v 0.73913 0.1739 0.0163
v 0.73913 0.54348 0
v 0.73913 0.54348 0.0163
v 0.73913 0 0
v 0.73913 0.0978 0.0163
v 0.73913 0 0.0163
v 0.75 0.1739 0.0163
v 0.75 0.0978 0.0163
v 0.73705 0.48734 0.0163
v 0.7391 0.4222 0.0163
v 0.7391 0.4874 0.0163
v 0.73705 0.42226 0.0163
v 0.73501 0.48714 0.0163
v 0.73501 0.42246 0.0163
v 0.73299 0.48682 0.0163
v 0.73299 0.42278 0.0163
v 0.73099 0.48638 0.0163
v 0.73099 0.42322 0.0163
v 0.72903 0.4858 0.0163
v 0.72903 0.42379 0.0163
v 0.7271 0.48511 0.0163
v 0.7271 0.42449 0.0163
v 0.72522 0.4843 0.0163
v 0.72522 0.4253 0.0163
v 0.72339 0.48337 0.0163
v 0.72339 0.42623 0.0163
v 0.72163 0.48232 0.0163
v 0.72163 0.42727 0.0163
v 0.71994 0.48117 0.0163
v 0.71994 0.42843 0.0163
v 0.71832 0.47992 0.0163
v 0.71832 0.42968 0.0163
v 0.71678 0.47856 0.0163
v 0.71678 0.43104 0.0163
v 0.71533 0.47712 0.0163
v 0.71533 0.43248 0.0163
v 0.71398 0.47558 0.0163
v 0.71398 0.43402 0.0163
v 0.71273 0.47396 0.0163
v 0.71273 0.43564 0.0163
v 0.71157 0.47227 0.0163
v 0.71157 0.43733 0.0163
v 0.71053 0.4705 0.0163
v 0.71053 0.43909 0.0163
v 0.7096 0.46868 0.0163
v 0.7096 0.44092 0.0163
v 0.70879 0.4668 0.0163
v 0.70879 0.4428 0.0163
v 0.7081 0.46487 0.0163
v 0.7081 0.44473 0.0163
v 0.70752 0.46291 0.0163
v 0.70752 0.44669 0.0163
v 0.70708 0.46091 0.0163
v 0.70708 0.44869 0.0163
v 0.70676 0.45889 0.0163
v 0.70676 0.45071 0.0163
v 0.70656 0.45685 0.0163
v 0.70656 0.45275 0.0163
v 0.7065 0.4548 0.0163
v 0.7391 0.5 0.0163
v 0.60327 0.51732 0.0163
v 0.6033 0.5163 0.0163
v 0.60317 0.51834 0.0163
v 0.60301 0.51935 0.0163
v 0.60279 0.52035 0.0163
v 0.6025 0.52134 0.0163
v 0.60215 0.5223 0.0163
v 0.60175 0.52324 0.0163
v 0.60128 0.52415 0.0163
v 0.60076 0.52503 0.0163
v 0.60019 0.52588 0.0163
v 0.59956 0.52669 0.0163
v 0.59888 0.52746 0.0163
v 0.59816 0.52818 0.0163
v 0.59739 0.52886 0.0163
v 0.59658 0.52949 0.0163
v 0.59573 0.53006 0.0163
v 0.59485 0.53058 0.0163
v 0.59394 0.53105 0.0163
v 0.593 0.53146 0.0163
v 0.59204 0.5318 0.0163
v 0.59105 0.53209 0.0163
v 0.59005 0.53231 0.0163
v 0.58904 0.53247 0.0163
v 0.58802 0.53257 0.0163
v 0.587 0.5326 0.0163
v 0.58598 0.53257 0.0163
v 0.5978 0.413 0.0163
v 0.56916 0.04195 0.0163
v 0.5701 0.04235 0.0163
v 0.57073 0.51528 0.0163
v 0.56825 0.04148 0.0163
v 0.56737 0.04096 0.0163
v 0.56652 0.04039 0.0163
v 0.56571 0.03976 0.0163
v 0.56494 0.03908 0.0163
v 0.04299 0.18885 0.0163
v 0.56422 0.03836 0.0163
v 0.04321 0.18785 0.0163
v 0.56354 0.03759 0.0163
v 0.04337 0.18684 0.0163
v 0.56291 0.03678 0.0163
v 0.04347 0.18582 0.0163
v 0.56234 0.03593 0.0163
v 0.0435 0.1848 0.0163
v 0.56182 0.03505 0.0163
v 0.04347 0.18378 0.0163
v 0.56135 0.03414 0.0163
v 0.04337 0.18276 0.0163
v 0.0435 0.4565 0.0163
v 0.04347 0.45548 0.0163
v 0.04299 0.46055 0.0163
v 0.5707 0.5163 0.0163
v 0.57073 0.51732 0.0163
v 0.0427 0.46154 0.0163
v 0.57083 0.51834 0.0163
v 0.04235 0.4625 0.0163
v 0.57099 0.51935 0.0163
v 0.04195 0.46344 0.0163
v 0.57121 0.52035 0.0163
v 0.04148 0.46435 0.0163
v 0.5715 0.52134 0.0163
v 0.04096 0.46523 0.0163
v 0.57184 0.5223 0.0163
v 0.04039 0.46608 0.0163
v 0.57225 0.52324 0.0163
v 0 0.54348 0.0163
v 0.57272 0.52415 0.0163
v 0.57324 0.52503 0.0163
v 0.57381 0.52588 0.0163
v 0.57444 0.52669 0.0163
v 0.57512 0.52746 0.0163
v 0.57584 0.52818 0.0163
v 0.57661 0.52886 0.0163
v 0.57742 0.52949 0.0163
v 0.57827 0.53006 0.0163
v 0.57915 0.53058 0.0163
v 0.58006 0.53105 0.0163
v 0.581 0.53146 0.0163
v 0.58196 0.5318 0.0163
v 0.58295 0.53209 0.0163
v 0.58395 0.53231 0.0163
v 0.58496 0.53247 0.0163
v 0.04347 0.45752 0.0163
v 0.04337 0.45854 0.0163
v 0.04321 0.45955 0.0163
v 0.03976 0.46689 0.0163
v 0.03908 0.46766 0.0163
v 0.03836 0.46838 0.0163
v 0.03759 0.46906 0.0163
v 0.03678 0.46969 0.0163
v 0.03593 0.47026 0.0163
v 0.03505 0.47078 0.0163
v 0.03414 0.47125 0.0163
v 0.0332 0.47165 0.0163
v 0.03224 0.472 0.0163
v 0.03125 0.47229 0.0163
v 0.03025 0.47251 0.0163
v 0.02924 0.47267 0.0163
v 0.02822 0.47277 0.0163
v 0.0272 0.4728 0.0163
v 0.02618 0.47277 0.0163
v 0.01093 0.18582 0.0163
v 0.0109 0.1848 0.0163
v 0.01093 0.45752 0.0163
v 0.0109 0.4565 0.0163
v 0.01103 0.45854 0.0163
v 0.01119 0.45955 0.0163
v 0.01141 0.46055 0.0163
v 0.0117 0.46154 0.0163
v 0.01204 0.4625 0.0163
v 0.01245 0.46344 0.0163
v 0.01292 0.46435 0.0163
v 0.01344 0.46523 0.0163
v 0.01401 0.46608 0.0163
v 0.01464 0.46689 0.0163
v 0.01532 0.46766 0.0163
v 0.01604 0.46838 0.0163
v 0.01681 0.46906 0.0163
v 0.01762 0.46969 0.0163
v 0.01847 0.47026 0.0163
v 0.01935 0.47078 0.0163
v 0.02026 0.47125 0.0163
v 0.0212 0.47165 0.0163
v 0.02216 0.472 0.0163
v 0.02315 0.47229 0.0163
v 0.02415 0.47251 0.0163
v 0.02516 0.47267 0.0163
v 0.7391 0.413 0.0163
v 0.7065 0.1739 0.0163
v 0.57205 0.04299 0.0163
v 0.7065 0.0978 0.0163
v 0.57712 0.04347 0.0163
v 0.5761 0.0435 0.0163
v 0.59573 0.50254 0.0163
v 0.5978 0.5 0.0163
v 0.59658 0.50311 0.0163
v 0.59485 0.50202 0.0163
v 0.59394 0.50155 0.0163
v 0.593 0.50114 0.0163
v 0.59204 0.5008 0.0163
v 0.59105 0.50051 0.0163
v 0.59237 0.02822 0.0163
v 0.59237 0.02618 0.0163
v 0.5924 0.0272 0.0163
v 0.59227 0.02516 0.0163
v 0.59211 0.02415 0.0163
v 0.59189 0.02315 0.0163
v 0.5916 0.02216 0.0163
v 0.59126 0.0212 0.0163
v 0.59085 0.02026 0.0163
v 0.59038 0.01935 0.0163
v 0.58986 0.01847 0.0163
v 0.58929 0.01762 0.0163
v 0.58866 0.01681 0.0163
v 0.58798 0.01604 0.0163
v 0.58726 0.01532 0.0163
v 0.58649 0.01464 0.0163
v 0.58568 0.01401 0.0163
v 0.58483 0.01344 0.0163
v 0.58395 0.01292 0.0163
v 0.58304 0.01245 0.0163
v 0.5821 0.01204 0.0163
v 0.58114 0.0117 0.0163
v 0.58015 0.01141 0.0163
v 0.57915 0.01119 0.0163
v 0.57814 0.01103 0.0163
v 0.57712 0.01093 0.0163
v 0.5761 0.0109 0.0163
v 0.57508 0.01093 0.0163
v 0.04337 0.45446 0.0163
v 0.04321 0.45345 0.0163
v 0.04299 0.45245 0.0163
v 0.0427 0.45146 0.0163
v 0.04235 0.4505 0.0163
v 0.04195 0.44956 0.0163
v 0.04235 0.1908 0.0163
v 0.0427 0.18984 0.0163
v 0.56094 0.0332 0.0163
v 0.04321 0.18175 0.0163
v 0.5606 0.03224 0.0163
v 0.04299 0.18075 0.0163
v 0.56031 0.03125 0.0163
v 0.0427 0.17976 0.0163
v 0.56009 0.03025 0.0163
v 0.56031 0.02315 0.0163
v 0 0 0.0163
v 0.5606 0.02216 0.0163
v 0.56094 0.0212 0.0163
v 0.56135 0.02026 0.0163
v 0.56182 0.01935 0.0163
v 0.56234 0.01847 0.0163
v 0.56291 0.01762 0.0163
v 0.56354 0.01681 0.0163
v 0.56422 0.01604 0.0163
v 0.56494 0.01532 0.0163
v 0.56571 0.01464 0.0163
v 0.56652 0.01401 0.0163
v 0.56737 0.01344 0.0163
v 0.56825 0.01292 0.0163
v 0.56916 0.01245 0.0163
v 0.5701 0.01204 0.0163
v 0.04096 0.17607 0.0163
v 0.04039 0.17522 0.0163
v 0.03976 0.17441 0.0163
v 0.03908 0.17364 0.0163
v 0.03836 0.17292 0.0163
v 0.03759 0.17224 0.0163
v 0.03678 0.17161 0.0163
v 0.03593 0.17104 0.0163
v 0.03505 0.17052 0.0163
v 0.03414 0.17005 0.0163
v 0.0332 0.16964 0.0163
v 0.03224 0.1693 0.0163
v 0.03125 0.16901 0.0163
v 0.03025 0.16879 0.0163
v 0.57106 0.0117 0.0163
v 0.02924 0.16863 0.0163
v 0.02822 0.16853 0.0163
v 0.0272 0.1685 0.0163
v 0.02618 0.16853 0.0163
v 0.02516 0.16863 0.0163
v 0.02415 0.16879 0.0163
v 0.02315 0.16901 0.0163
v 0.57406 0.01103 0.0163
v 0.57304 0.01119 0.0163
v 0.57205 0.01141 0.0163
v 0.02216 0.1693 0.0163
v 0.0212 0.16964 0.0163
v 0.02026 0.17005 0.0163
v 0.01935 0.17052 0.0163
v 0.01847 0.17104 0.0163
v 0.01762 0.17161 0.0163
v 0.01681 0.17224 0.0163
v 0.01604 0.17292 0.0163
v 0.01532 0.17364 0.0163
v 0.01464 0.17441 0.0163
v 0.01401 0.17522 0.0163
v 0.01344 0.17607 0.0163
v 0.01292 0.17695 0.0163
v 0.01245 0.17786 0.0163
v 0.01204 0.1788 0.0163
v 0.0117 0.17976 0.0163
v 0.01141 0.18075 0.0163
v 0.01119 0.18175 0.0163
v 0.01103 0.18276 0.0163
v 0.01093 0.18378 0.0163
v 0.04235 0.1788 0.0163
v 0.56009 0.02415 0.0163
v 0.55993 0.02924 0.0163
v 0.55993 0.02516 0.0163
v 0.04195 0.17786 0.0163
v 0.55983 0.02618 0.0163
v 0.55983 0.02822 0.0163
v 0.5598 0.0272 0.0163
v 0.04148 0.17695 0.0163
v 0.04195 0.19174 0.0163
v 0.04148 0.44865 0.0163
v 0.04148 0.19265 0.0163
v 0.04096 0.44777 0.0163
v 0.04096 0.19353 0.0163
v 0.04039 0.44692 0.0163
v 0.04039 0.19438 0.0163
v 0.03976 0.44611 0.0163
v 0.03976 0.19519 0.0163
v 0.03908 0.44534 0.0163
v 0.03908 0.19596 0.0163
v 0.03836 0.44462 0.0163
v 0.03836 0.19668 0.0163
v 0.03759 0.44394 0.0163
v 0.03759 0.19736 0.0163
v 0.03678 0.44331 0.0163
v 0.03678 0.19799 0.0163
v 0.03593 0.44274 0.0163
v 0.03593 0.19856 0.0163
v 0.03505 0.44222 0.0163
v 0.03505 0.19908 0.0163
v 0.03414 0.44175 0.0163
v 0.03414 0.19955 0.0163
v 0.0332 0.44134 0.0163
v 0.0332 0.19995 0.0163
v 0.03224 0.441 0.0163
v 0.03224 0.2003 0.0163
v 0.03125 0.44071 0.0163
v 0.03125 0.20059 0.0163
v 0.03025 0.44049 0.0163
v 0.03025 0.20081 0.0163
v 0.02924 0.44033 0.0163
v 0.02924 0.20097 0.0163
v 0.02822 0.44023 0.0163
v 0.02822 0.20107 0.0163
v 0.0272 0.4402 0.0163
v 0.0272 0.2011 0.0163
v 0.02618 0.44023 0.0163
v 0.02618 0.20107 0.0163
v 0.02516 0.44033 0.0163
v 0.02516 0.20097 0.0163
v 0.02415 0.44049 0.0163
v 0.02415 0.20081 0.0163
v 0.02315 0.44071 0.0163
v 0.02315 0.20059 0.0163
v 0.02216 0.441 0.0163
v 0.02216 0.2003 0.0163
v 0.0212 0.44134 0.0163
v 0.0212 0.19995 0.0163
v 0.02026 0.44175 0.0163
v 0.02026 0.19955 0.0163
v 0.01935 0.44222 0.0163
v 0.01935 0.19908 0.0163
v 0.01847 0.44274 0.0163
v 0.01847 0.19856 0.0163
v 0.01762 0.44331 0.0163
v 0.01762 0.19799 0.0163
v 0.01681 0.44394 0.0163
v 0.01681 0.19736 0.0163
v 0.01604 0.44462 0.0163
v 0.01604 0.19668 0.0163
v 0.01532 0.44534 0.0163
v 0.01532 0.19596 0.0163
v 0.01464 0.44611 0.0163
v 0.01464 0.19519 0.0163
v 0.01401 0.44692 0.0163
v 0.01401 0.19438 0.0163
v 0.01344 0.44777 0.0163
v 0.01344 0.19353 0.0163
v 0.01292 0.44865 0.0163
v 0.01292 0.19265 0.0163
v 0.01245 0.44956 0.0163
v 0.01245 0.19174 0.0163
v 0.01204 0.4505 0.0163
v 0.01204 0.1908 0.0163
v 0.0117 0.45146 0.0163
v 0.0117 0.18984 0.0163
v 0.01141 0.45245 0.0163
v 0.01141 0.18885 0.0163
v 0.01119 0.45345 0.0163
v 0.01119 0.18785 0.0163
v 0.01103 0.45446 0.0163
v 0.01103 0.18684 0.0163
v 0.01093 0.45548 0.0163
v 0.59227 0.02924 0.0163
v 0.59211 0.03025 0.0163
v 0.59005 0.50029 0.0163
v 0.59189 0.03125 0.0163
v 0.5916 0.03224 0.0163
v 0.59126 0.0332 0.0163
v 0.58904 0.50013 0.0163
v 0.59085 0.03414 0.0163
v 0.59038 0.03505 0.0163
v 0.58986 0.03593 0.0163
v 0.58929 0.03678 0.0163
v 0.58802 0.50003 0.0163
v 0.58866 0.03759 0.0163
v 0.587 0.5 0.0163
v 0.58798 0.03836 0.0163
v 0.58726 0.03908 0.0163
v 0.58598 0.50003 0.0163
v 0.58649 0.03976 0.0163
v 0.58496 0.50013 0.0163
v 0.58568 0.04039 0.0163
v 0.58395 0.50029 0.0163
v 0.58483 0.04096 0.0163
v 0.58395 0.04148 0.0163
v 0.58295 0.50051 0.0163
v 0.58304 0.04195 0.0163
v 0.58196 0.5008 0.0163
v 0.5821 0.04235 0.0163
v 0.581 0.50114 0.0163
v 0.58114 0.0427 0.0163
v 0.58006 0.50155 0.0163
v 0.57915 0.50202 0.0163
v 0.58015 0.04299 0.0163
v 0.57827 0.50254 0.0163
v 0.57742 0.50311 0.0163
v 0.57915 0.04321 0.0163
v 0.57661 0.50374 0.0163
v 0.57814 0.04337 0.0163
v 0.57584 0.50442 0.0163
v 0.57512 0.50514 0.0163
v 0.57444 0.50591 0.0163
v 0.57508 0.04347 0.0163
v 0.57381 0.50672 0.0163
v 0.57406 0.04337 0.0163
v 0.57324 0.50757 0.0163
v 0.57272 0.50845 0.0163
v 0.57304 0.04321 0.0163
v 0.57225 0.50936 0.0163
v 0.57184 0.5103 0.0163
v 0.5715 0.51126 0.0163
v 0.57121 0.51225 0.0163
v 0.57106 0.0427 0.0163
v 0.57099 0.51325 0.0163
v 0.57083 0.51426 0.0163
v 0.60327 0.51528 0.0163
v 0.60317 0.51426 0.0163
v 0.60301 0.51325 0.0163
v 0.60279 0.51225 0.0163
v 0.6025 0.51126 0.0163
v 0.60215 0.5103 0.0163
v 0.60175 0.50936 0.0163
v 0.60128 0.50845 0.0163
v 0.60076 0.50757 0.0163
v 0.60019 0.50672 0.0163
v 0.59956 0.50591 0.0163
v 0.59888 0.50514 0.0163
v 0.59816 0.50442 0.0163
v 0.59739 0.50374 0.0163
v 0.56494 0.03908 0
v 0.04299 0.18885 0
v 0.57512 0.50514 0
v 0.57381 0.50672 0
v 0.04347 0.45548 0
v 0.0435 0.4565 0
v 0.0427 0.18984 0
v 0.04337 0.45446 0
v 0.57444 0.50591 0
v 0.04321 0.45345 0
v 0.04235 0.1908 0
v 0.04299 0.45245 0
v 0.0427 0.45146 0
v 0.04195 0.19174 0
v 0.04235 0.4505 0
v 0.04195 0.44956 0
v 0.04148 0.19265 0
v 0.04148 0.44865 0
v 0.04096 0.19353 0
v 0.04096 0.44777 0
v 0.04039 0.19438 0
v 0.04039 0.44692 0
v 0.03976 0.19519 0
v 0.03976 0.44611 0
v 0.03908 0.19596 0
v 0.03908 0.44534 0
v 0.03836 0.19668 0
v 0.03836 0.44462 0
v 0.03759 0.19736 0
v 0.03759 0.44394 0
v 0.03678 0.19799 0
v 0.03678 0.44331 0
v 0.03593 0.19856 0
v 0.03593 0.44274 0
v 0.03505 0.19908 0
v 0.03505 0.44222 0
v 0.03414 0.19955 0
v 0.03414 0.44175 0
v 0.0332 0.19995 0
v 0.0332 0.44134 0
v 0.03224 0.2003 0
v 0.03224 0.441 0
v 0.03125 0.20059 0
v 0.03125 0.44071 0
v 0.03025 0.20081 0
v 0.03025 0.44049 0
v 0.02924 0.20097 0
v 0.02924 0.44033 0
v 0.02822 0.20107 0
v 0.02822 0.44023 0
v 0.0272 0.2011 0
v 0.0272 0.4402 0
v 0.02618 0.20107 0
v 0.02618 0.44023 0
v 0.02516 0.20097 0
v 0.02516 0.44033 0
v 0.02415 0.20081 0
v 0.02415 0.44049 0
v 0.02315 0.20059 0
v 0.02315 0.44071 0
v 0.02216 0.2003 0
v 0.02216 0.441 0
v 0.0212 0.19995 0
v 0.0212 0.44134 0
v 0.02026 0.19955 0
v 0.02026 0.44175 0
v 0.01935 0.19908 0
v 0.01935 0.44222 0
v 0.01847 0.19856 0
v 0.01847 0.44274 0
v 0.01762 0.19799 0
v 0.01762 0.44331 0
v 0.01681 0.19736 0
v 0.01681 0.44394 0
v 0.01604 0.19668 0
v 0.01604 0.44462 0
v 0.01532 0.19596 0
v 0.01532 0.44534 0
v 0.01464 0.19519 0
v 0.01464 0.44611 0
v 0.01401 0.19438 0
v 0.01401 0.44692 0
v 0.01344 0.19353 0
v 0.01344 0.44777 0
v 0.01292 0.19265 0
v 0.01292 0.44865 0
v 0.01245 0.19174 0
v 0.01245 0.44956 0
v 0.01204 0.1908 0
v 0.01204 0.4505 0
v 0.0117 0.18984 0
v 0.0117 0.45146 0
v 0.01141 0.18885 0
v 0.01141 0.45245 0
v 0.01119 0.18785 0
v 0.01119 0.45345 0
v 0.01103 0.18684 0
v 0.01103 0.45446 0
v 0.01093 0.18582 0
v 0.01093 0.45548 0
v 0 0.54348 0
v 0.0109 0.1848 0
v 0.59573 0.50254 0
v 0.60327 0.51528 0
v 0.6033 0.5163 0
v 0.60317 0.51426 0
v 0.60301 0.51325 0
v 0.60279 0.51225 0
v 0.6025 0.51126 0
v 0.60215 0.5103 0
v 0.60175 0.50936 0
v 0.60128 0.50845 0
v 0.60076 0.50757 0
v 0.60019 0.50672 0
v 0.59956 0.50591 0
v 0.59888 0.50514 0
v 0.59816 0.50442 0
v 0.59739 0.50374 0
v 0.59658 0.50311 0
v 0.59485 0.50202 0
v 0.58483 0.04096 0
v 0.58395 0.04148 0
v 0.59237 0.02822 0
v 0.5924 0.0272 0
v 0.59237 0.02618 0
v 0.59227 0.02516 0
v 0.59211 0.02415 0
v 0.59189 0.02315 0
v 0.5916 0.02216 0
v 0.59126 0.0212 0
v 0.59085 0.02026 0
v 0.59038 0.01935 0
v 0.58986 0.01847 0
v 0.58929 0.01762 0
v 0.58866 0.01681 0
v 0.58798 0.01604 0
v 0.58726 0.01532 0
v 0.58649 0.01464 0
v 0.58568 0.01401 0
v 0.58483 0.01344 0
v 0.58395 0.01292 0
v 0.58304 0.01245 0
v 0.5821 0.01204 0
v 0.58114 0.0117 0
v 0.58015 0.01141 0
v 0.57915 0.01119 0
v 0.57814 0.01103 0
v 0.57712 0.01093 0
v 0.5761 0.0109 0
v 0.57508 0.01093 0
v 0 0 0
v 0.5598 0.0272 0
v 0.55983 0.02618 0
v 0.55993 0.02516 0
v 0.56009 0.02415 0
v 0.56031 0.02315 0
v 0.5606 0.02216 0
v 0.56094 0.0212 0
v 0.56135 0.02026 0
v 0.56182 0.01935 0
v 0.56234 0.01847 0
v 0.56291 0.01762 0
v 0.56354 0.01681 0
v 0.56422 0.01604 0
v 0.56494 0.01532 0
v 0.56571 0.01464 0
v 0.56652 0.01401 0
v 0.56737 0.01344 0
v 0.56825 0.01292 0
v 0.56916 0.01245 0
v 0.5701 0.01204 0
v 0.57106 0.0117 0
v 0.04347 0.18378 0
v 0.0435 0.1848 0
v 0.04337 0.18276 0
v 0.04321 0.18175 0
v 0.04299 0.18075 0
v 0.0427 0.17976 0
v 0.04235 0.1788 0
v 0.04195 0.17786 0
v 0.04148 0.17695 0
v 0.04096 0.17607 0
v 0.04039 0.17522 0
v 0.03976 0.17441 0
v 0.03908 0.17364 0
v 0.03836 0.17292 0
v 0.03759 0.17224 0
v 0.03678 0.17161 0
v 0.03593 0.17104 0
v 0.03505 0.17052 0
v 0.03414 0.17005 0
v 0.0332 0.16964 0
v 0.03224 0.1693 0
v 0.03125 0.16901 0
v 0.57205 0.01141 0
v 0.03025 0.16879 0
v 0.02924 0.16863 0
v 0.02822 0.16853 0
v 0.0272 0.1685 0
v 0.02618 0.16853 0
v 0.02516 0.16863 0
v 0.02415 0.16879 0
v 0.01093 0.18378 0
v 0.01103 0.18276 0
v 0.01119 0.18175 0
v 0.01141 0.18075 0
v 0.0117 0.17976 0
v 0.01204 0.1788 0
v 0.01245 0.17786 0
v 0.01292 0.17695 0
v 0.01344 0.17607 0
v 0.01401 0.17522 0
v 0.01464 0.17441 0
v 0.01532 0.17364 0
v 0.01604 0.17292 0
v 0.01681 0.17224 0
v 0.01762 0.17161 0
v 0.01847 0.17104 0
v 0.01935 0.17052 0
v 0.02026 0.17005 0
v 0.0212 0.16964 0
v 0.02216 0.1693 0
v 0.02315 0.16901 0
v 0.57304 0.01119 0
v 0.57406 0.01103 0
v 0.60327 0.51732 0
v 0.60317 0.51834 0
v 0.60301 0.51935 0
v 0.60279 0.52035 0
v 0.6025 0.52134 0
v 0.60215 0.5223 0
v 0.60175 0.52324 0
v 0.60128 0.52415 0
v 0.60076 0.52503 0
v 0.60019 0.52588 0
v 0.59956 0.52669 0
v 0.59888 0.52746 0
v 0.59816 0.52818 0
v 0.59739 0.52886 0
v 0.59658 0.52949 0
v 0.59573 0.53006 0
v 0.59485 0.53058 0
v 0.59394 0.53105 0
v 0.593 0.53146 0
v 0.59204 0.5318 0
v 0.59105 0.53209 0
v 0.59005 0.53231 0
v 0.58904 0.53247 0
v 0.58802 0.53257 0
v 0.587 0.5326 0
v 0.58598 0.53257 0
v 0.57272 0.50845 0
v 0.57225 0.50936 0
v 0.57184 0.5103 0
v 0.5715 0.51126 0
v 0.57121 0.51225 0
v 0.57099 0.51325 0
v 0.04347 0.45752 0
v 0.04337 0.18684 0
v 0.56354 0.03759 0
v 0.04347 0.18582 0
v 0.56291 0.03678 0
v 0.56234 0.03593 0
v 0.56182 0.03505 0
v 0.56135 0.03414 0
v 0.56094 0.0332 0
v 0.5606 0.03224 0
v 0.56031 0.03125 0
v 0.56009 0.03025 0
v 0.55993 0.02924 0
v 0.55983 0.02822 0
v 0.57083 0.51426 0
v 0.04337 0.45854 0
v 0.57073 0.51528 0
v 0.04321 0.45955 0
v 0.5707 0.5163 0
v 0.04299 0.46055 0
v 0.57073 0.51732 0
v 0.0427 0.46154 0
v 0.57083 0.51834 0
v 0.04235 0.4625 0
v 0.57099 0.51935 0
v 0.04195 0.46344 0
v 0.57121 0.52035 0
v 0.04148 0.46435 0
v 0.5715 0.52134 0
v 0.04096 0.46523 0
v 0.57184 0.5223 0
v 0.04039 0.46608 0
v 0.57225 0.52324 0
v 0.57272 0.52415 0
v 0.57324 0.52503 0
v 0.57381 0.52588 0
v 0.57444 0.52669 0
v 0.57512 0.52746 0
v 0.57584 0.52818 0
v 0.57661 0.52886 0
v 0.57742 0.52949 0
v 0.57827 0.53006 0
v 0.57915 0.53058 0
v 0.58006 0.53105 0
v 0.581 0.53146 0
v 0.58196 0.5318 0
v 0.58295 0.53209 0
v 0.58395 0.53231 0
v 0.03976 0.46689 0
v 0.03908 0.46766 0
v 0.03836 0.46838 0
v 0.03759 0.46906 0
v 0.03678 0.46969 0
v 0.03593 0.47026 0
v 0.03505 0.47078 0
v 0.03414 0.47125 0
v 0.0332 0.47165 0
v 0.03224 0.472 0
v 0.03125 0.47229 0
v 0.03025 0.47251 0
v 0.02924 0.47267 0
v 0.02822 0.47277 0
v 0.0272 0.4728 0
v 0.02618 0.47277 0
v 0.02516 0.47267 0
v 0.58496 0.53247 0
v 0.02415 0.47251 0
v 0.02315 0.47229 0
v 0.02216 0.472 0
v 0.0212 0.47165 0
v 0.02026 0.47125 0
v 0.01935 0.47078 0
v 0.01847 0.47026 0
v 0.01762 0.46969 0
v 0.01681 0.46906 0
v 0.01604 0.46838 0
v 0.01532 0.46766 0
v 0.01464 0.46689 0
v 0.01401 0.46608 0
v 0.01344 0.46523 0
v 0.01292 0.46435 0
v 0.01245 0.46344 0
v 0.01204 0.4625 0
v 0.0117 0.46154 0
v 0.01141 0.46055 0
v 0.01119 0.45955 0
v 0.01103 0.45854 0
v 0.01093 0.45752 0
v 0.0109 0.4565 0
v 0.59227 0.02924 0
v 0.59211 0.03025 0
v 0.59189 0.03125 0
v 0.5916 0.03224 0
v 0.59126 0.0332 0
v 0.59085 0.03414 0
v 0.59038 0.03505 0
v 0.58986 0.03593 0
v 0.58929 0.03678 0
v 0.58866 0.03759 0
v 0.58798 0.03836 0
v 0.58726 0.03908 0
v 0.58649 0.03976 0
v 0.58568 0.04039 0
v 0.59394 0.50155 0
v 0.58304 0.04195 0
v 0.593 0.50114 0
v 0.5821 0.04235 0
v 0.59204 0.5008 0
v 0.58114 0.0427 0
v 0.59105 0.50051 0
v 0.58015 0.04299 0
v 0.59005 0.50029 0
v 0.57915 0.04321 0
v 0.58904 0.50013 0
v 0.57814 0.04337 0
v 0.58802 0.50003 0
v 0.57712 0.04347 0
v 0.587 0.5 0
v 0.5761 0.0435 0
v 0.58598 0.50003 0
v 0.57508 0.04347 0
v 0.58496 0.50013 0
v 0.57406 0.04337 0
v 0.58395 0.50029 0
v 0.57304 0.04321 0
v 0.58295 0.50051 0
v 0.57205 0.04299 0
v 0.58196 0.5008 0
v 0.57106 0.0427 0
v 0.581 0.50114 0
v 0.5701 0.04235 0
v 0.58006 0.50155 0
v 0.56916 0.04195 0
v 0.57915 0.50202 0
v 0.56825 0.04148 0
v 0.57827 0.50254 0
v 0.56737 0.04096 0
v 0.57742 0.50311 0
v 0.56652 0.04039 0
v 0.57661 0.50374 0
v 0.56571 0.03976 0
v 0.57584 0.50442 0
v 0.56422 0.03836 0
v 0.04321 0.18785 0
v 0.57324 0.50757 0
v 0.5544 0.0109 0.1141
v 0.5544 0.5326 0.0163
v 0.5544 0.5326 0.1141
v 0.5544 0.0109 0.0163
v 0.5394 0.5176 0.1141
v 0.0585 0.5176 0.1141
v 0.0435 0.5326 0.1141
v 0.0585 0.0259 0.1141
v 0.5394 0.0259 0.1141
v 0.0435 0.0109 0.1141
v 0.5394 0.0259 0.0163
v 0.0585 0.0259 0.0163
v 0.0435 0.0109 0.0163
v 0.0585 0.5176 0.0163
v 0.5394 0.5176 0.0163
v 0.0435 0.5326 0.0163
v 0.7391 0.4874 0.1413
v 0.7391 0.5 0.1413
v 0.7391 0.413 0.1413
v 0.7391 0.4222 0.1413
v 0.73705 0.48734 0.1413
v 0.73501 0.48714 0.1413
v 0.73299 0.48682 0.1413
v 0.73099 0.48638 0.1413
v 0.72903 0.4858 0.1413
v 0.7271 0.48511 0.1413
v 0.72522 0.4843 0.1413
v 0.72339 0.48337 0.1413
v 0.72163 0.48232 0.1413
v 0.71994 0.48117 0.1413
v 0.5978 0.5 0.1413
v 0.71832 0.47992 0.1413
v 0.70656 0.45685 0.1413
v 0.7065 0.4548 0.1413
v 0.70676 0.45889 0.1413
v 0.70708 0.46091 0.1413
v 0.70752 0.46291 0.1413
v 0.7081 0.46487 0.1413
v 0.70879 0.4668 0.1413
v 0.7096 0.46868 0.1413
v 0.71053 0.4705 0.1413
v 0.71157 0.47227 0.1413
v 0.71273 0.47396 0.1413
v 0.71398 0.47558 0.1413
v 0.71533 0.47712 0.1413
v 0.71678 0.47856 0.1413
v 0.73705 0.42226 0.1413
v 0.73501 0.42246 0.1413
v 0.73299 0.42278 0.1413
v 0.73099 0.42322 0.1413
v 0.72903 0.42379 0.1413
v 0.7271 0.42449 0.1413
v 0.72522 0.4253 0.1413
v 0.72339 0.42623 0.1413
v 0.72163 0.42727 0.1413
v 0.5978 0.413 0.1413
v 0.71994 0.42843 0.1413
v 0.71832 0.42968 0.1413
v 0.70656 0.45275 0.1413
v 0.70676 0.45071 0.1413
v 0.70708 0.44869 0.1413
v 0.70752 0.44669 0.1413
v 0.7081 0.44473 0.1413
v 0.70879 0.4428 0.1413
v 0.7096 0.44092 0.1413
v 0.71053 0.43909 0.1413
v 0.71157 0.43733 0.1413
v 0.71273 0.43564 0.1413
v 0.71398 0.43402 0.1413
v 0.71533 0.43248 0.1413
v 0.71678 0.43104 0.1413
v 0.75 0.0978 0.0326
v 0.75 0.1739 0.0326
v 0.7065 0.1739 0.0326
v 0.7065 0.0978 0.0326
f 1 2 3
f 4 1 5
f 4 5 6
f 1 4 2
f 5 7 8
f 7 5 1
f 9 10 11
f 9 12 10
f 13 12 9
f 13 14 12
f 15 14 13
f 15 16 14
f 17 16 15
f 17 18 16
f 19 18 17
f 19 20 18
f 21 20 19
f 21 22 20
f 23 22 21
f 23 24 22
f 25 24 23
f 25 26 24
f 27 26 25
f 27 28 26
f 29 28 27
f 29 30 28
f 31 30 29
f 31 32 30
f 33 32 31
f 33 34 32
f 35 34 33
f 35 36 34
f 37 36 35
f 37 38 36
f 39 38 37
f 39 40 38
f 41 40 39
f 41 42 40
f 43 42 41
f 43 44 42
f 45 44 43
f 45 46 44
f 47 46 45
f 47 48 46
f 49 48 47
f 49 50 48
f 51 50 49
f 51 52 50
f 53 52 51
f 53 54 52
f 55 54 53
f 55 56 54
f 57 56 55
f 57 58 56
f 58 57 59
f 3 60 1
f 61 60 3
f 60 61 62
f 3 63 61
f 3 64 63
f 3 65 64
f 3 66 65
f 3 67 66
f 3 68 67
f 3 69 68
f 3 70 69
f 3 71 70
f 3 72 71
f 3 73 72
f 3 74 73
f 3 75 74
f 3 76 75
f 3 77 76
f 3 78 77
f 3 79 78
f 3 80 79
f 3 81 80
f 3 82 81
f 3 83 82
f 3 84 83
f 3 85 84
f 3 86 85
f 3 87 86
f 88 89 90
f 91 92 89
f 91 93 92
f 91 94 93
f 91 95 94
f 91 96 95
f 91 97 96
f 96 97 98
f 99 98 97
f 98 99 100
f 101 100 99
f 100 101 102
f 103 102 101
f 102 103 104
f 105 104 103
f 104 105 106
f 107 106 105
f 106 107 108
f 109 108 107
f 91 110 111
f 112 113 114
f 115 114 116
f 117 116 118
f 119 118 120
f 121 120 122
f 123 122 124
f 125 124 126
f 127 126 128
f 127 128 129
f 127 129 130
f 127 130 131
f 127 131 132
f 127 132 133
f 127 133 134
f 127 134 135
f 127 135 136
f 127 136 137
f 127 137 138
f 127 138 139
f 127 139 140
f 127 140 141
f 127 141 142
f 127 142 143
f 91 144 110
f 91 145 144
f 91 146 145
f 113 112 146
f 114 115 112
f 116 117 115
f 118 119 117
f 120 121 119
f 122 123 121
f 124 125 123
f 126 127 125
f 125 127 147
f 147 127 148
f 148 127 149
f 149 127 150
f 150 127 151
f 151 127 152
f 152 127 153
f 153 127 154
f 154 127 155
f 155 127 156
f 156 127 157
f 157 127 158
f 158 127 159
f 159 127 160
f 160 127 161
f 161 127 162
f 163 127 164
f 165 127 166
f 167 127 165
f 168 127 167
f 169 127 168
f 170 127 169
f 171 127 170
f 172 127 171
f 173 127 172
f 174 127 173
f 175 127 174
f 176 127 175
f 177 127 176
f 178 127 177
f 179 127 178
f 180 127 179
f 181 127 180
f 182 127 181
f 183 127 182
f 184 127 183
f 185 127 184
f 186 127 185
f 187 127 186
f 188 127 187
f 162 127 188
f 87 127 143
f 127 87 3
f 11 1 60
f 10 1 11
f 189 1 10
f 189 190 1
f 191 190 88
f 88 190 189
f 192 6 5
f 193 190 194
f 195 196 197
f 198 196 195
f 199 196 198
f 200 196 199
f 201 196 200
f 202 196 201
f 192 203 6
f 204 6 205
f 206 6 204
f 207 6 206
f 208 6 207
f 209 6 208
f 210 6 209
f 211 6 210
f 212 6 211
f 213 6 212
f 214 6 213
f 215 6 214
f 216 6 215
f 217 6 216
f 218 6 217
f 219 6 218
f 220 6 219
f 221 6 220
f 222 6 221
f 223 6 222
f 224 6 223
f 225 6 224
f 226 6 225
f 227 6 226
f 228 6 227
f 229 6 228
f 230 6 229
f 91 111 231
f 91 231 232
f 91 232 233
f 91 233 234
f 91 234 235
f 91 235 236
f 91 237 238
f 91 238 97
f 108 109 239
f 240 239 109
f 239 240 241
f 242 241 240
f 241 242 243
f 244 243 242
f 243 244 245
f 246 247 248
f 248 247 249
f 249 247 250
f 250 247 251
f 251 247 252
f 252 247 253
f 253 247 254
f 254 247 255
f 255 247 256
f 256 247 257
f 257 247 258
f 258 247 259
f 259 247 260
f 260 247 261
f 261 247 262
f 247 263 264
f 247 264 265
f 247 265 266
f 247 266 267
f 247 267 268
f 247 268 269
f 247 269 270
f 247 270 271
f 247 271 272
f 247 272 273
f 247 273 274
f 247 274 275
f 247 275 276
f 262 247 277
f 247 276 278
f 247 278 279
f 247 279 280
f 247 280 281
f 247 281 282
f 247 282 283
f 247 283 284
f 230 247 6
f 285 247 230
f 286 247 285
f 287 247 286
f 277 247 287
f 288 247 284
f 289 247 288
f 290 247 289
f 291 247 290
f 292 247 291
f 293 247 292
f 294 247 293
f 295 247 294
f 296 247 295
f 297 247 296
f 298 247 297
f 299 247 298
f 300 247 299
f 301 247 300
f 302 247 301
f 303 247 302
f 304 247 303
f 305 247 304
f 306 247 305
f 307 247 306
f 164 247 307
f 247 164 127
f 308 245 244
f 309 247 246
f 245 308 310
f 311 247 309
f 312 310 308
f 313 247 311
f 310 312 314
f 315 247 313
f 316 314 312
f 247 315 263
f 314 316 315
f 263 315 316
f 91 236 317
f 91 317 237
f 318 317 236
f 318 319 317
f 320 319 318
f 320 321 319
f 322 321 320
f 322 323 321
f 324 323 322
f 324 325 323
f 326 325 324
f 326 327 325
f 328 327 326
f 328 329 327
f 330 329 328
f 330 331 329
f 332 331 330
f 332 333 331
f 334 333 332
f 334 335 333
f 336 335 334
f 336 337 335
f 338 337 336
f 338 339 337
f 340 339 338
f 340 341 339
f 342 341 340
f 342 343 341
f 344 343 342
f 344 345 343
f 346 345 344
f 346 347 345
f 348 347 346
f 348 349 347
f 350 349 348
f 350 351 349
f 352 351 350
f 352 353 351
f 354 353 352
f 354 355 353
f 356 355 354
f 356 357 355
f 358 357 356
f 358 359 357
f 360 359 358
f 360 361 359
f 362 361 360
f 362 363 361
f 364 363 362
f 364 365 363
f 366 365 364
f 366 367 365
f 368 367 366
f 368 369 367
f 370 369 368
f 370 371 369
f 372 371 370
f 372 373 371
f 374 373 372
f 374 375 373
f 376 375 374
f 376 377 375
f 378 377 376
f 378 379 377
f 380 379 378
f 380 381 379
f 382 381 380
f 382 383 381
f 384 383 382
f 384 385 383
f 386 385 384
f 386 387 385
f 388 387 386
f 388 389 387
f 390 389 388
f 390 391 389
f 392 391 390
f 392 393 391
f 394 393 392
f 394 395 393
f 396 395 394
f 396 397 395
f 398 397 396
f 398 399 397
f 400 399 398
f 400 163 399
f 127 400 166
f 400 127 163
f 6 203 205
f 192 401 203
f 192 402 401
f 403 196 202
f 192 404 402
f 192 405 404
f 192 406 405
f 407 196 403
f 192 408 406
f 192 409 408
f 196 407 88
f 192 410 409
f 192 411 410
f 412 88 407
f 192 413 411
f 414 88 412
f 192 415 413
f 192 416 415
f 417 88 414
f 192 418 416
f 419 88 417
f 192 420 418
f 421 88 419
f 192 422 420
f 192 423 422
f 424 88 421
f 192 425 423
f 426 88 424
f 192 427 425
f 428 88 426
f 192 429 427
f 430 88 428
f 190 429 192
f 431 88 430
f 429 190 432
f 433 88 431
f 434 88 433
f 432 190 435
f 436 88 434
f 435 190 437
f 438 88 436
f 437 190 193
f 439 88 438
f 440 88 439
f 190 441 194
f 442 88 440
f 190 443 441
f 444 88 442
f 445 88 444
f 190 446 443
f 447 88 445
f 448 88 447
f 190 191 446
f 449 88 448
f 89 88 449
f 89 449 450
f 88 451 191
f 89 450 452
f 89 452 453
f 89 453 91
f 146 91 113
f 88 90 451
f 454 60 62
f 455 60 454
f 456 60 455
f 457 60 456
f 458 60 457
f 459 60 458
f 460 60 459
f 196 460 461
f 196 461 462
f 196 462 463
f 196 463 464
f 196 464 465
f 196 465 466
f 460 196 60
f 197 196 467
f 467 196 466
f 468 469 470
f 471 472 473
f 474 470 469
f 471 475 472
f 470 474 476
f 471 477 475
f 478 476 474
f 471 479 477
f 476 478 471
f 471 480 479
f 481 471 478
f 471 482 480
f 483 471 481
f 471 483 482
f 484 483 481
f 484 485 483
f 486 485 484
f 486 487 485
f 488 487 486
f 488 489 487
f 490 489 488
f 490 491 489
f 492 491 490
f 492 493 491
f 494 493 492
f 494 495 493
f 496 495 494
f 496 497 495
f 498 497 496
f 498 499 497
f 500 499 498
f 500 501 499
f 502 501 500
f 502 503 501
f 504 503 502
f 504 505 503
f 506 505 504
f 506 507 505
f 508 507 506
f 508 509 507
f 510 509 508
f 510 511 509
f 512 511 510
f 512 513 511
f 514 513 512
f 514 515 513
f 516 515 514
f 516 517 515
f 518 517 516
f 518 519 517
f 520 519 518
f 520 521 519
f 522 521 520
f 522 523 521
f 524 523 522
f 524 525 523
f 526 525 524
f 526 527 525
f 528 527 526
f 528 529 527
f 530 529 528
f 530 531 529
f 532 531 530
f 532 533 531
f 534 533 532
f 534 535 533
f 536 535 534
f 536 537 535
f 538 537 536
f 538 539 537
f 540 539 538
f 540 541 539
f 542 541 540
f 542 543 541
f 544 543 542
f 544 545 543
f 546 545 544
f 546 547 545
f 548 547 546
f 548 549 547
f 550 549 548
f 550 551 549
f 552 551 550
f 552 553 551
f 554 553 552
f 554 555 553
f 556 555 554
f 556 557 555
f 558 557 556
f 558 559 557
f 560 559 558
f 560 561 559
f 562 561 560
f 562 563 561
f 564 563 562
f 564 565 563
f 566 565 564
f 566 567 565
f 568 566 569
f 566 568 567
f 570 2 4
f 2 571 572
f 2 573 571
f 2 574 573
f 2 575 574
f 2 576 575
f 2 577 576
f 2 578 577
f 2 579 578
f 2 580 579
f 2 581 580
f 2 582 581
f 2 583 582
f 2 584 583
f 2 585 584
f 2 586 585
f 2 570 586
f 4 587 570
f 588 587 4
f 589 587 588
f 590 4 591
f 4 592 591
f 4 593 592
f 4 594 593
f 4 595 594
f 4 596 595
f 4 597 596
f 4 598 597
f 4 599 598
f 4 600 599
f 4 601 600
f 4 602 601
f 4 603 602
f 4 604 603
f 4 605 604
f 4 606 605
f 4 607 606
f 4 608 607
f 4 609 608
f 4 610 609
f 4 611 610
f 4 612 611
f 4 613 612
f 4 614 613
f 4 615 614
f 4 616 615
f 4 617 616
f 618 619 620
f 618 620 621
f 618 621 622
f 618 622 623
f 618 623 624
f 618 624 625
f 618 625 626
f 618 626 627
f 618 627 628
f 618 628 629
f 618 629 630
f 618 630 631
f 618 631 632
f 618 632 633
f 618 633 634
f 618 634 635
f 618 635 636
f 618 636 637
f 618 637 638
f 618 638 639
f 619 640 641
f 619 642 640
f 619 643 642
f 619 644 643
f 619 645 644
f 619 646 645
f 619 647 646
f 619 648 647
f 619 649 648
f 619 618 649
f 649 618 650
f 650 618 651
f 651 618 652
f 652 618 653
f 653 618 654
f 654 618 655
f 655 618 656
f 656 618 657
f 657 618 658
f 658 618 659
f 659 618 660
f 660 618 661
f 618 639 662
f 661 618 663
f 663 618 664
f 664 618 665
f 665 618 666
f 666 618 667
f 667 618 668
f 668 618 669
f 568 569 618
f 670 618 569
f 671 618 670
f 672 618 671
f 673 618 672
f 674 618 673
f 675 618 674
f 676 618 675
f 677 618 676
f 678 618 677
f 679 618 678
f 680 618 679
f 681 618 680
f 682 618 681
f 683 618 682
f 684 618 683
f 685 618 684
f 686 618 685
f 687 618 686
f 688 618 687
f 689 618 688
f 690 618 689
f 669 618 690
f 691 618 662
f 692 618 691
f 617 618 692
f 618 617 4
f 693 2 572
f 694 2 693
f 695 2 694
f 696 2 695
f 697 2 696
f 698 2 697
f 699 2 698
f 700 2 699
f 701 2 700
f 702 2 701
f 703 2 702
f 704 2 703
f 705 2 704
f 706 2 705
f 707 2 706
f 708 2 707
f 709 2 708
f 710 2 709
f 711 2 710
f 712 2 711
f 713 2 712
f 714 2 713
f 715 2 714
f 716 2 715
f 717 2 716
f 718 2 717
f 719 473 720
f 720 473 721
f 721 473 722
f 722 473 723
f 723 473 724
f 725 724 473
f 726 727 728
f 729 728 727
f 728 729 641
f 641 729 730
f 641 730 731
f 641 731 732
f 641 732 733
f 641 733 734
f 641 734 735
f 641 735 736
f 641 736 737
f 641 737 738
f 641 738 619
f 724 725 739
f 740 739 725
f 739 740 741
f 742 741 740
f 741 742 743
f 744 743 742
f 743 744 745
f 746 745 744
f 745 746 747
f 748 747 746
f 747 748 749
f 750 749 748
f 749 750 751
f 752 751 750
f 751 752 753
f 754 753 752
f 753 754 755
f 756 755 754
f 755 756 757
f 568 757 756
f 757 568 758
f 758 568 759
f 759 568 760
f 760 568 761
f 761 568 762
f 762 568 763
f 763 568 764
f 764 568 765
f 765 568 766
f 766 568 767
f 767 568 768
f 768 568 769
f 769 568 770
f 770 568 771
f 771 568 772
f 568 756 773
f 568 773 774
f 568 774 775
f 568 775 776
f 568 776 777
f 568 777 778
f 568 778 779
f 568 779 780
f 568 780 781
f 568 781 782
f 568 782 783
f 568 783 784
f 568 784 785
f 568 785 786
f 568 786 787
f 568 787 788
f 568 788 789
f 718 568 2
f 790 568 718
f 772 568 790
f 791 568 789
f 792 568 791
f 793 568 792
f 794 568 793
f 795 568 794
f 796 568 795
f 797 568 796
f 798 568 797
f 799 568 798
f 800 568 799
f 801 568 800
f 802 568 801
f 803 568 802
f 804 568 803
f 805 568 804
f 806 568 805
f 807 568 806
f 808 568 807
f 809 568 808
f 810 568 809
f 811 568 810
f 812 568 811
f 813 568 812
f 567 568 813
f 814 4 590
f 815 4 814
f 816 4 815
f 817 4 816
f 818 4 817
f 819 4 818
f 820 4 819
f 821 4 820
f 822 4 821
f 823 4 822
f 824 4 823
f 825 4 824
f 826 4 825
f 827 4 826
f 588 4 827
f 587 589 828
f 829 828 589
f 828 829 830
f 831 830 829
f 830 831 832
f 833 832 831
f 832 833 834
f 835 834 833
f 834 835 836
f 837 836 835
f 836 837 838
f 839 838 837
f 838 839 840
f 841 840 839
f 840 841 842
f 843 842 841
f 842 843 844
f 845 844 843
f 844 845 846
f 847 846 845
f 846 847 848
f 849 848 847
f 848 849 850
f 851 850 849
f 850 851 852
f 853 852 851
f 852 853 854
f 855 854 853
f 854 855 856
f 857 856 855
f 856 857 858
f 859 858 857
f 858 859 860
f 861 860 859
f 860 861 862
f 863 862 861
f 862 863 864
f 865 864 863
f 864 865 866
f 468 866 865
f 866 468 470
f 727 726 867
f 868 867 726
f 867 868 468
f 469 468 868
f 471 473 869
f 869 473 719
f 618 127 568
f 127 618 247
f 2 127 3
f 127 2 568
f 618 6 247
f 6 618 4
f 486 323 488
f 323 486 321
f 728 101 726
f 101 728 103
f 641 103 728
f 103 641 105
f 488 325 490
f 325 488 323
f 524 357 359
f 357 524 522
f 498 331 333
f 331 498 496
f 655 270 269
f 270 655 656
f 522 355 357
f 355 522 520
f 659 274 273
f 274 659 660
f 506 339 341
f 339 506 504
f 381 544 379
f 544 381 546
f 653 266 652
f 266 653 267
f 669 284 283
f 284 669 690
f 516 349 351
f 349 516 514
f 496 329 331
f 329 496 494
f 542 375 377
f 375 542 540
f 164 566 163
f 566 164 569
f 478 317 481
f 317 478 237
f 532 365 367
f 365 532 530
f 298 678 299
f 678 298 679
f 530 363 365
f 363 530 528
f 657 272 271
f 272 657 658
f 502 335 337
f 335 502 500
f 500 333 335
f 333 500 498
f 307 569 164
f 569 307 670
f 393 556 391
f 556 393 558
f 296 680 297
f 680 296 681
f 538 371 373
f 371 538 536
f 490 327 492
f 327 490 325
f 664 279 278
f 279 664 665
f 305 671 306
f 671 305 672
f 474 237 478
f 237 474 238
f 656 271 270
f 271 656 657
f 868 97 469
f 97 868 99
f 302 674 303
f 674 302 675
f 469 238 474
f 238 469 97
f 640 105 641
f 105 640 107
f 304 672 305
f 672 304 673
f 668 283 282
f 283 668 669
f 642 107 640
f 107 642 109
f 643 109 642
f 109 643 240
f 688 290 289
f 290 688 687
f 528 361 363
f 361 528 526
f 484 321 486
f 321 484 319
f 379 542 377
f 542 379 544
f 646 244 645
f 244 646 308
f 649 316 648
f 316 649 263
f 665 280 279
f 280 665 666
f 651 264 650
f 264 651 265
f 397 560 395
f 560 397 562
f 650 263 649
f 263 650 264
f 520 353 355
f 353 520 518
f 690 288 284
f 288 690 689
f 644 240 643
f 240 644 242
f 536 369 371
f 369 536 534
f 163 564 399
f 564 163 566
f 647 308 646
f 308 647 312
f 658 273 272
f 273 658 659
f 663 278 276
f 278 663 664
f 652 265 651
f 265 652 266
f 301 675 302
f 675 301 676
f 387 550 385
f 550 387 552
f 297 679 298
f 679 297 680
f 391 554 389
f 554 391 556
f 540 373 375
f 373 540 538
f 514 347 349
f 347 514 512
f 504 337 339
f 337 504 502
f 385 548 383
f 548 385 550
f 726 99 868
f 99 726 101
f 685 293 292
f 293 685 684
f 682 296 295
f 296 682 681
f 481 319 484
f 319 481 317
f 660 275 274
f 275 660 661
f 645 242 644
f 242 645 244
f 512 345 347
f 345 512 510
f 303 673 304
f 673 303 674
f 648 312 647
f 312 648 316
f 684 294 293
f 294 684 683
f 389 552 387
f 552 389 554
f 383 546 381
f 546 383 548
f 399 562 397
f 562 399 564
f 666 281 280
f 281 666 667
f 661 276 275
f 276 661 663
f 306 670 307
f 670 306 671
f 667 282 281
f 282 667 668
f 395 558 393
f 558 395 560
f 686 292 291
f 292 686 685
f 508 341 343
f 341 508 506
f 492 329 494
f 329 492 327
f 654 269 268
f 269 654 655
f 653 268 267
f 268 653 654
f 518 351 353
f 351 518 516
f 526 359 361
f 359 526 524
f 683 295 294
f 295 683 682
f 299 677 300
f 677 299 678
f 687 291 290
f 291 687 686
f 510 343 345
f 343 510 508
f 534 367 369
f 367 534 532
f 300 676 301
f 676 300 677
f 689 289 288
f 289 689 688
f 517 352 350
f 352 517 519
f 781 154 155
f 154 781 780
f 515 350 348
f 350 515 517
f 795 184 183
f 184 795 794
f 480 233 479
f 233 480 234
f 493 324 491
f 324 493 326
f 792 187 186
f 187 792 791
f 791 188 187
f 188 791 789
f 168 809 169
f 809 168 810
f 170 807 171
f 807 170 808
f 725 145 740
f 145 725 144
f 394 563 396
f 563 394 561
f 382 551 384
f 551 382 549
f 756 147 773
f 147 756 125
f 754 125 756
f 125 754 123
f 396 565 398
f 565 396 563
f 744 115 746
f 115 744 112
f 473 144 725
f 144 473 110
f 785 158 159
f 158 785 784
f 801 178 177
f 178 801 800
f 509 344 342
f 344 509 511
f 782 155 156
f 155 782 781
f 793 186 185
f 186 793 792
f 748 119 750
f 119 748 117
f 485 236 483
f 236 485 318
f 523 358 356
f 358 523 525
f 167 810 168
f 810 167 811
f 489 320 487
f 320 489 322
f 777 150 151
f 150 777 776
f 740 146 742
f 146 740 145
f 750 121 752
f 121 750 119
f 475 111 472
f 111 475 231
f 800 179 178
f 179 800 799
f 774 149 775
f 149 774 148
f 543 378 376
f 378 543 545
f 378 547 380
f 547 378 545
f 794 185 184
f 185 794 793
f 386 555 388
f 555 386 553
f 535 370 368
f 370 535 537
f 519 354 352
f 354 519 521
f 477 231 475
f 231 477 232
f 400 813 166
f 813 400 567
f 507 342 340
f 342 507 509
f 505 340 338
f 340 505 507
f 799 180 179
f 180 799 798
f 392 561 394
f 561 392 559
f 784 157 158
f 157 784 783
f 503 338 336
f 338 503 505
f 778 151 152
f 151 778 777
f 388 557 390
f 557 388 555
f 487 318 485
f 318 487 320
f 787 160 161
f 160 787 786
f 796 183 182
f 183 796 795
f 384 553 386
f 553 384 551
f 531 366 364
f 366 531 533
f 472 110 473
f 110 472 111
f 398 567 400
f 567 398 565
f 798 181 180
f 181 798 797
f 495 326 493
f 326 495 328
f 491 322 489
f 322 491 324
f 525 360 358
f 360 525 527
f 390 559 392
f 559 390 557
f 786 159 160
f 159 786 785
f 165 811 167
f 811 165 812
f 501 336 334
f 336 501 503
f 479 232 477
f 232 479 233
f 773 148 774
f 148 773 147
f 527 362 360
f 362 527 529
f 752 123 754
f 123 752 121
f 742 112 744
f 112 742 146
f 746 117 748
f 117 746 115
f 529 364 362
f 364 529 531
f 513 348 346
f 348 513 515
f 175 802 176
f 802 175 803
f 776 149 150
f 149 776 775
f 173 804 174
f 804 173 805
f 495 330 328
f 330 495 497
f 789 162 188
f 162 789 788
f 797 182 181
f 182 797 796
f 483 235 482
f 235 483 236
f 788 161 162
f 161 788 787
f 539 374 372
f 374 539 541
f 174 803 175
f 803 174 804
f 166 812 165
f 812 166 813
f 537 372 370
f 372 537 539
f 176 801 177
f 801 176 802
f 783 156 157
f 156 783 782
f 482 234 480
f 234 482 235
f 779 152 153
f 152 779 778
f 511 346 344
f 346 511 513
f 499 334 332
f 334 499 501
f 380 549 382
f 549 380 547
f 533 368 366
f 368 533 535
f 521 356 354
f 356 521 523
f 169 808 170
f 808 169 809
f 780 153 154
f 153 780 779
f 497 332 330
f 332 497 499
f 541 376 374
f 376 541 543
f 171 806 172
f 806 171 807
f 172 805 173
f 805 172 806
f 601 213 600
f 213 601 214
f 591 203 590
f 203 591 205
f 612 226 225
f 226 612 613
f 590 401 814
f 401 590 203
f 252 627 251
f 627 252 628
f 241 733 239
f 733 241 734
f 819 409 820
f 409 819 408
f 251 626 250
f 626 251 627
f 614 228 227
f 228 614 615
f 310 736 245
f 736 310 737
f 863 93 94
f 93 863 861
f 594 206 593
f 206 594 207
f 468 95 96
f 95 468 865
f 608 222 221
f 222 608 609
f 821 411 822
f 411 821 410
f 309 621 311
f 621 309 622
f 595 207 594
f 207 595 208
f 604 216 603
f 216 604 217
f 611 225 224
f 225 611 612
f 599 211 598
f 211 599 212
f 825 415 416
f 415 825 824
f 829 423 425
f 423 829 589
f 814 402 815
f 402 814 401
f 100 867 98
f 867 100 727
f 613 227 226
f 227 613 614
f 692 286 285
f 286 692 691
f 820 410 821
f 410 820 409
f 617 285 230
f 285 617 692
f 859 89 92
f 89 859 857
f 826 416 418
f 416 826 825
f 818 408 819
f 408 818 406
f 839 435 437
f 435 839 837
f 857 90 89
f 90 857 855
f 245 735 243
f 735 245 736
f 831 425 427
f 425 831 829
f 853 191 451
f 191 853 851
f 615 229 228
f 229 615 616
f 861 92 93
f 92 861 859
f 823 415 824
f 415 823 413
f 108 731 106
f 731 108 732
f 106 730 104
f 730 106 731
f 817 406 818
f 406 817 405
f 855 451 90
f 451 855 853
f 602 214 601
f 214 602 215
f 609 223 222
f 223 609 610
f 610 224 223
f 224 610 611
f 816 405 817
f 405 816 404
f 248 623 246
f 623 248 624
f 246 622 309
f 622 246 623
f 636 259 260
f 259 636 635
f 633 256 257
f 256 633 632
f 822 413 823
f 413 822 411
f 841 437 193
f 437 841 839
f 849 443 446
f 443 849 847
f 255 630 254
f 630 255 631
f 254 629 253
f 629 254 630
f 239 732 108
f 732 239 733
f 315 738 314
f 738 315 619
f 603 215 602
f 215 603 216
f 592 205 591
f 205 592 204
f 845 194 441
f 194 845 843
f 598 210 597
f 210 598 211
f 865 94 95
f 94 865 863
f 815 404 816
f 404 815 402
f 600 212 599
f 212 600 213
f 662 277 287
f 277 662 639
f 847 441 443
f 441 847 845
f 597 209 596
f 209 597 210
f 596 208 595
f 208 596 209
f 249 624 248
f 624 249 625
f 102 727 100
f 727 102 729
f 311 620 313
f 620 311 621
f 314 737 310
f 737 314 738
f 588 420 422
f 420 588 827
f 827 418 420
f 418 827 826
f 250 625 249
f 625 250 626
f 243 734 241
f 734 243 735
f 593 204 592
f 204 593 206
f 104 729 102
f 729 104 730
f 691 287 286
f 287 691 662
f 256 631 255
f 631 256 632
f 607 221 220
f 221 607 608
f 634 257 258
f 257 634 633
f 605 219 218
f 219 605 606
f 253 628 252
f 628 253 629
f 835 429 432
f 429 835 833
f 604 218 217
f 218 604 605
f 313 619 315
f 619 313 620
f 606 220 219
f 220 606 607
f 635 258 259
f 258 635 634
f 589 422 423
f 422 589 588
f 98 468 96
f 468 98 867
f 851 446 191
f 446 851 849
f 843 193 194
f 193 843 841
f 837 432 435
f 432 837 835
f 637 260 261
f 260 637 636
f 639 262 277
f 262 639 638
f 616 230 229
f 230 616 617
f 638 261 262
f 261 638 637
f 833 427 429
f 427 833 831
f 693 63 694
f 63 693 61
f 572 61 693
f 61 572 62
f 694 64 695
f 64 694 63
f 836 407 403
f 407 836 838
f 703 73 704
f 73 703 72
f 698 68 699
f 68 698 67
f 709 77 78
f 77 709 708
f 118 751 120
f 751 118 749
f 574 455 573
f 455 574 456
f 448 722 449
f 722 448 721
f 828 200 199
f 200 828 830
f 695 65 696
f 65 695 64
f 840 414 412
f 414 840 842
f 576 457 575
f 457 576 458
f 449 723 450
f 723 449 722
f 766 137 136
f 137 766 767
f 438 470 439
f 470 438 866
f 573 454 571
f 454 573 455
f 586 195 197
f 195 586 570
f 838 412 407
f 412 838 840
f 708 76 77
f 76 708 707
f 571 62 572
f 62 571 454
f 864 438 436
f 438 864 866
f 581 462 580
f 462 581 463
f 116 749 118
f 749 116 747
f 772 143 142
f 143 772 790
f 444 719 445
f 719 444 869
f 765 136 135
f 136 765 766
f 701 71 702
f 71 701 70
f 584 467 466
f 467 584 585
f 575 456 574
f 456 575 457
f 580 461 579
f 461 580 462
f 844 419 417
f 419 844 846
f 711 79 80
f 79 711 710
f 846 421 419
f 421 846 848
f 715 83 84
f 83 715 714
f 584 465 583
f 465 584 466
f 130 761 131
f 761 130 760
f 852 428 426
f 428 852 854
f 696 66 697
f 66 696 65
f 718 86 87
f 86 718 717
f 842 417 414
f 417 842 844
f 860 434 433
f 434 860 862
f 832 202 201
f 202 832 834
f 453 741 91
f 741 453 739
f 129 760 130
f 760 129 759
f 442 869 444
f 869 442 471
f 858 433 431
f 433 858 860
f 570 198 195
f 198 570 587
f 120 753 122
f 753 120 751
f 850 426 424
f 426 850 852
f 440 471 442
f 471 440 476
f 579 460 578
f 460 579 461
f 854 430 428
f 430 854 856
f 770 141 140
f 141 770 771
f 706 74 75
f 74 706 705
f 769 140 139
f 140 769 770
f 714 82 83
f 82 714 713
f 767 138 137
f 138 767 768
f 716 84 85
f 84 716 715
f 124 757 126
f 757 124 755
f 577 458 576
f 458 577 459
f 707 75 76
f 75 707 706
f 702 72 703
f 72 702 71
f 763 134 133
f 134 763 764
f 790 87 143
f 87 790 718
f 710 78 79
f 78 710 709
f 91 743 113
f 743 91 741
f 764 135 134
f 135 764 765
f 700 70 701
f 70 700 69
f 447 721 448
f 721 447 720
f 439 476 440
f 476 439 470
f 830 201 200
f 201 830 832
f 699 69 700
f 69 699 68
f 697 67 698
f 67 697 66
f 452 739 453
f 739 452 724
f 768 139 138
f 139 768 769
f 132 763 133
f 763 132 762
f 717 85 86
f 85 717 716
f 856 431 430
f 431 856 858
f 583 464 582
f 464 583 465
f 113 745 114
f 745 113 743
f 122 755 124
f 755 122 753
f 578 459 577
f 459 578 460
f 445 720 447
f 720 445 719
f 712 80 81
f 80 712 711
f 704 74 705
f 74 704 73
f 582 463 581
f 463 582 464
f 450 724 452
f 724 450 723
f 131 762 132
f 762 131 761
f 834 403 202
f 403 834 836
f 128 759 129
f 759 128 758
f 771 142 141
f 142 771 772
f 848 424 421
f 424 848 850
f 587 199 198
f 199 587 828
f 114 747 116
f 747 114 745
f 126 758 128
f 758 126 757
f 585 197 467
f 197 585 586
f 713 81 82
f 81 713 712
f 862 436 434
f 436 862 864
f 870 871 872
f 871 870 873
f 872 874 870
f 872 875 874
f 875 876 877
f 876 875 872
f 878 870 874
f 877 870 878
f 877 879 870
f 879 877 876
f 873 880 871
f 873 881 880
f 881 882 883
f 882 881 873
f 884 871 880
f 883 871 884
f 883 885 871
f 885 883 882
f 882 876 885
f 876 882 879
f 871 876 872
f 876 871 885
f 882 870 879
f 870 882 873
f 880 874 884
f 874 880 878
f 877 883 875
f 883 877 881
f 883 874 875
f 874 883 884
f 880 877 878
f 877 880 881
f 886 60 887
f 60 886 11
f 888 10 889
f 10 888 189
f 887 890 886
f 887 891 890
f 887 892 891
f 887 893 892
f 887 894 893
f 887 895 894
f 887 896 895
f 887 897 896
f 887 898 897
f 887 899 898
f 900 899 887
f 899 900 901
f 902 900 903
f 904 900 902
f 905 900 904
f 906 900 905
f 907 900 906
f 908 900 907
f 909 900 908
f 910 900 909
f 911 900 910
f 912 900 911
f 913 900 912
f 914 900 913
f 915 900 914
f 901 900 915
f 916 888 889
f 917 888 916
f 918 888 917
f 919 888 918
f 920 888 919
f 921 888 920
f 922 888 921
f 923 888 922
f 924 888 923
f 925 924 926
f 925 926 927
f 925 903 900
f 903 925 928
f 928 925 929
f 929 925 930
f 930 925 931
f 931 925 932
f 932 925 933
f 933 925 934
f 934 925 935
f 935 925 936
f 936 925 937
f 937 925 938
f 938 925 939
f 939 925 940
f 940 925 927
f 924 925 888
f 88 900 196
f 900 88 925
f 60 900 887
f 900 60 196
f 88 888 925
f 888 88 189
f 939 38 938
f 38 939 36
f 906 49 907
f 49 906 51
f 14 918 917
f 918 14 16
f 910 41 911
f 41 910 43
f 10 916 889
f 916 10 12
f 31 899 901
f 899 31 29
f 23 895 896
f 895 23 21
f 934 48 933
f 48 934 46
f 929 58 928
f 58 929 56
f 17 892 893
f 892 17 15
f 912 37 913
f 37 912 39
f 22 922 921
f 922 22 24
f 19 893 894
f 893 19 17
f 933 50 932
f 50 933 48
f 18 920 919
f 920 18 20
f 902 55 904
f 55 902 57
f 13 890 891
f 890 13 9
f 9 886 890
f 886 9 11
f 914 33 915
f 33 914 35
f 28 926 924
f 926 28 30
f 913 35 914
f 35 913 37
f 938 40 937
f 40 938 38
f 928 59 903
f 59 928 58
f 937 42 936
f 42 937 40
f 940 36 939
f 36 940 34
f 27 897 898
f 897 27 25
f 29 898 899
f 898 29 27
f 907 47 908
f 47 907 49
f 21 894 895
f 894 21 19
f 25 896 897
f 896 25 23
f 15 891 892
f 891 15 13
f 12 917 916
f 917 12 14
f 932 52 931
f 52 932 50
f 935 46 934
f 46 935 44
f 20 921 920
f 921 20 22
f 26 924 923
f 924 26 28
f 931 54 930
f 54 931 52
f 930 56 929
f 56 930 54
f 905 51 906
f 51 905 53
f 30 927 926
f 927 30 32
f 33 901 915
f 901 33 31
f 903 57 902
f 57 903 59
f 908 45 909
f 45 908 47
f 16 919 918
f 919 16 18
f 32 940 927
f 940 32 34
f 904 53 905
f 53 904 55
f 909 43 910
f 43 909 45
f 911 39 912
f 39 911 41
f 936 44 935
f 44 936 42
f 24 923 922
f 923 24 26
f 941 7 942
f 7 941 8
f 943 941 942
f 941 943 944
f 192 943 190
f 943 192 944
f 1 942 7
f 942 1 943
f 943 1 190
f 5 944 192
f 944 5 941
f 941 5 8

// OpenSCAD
// Parameters for Base Plate
base_length = 0.73913;
base_width = 0.543478;
base_height = 0.016304;

// Parameters for Base Holes
base_hole_radius = 0.0163;
hole1_pos = [0.0272, 0.1848];
hole2_pos = [0.0272, 0.4565];
hole3_pos = [0.5761, 0.0272];
hole4_pos = [0.5870, 0.5163];

// Parameters for Raised Rail Group (Rib Outlines)
rail_span_x = 0.5109;
rail_span_y = 0.5217;
rail_offset_x = 0.0435;
rail_offset_y = 0.0109;
rail_height = 0.0978;
rail_wall_thickness = 0.015; // Wall thickness to create the rib outline effect

// Parameters for Shallow Rectangular Tab
tab_span_x = 0.0435;
tab_span_y = 0.0761;
tab_offset_x = 0.7065;
tab_offset_y = 0.0978;
tab_height = 0.0163;

// Parameters for Deeper Side Block
block_span_x = 0.1413;
block_span_y = 0.0870;
block_offset_x = 0.5978;
block_offset_y = 0.4130;
block_height = 0.1413;

// Parameters for Deeper Side Block Hole
block_hole_radius = 0.0326;
block_hole_x = 0.7391;
block_hole_y = 0.4548;

// Global Resolution
$fn = 100;

// Main Assembly
union() {
    
    // 1. Base Plate with 4 Through Holes
    difference() {
        // Main solid base
        cube([base_length, base_width, base_height]);
        
        // Subtract four circular openings
        translate([hole1_pos[0], hole1_pos[1], -0.1])
            cylinder(h = base_height + 0.2, r = base_hole_radius);
            
        translate([hole2_pos[0], hole2_pos[1], -0.1])
            cylinder(h = base_height + 0.2, r = base_hole_radius);
            
        translate([hole3_pos[0], hole3_pos[1], -0.1])
            cylinder(h = base_height + 0.2, r = base_hole_radius);
            
        translate([hole4_pos[0], hole4_pos[1], -0.1])
            cylinder(h = base_height + 0.2, r = base_hole_radius);
    }

    // 2. Main Raised Rail Group
    // Sits on top of the base plate
    translate([rail_offset_x, rail_offset_y, base_height]) {
        difference() {
            // Outer bounding box for the rails
            cube([rail_span_x, rail_span_y, rail_height]);
            
            // Hollow inner region to leave only rectangular rib outlines
            translate([rail_wall_thickness, rail_wall_thickness, -0.1])
                cube([
                    rail_span_x - 2 * rail_wall_thickness, 
                    rail_span_y - 2 * rail_wall_thickness, 
                    rail_height + 0.2
                ]);
        }
    }

    // 3. Shallow Rectangular Solid Tab
    // Sits on top of the base plate
    translate([tab_offset_x, tab_offset_y, base_height]) {
        cube([tab_span_x, tab_span_y, tab_height]);
    }

    // 4. Deeper Side Solid Block with Through Hole
    difference() {
        // Solid block body starting from the reference plane (z=0)
        translate([block_offset_x, block_offset_y, 0])
            cube([block_span_x, block_span_y, block_height]);
        
        // Circular through opening in the deeper block
        translate([block_hole_x, block_hole_y, -0.1])
            cylinder(h = block_height + 0.2, r = block_hole_radius);
    }
}
